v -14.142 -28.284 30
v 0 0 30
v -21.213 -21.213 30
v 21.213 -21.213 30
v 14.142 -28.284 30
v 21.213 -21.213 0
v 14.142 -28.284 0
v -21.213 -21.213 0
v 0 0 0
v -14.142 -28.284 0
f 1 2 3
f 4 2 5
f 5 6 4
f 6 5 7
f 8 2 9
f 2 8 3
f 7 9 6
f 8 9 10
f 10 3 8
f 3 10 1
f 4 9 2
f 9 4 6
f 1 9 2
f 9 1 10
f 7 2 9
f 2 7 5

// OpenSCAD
rotate([0,0,180])
rotate([0,-90,0]){
    difference(){
        rotate([-45,0,0]) {
            cube([30, 30, 30]);
        }
        scale([1,2,1]) {
            rotate([-45,0,0]) {
                cube([30, 30, 30]);
            }
        }
    }
}
